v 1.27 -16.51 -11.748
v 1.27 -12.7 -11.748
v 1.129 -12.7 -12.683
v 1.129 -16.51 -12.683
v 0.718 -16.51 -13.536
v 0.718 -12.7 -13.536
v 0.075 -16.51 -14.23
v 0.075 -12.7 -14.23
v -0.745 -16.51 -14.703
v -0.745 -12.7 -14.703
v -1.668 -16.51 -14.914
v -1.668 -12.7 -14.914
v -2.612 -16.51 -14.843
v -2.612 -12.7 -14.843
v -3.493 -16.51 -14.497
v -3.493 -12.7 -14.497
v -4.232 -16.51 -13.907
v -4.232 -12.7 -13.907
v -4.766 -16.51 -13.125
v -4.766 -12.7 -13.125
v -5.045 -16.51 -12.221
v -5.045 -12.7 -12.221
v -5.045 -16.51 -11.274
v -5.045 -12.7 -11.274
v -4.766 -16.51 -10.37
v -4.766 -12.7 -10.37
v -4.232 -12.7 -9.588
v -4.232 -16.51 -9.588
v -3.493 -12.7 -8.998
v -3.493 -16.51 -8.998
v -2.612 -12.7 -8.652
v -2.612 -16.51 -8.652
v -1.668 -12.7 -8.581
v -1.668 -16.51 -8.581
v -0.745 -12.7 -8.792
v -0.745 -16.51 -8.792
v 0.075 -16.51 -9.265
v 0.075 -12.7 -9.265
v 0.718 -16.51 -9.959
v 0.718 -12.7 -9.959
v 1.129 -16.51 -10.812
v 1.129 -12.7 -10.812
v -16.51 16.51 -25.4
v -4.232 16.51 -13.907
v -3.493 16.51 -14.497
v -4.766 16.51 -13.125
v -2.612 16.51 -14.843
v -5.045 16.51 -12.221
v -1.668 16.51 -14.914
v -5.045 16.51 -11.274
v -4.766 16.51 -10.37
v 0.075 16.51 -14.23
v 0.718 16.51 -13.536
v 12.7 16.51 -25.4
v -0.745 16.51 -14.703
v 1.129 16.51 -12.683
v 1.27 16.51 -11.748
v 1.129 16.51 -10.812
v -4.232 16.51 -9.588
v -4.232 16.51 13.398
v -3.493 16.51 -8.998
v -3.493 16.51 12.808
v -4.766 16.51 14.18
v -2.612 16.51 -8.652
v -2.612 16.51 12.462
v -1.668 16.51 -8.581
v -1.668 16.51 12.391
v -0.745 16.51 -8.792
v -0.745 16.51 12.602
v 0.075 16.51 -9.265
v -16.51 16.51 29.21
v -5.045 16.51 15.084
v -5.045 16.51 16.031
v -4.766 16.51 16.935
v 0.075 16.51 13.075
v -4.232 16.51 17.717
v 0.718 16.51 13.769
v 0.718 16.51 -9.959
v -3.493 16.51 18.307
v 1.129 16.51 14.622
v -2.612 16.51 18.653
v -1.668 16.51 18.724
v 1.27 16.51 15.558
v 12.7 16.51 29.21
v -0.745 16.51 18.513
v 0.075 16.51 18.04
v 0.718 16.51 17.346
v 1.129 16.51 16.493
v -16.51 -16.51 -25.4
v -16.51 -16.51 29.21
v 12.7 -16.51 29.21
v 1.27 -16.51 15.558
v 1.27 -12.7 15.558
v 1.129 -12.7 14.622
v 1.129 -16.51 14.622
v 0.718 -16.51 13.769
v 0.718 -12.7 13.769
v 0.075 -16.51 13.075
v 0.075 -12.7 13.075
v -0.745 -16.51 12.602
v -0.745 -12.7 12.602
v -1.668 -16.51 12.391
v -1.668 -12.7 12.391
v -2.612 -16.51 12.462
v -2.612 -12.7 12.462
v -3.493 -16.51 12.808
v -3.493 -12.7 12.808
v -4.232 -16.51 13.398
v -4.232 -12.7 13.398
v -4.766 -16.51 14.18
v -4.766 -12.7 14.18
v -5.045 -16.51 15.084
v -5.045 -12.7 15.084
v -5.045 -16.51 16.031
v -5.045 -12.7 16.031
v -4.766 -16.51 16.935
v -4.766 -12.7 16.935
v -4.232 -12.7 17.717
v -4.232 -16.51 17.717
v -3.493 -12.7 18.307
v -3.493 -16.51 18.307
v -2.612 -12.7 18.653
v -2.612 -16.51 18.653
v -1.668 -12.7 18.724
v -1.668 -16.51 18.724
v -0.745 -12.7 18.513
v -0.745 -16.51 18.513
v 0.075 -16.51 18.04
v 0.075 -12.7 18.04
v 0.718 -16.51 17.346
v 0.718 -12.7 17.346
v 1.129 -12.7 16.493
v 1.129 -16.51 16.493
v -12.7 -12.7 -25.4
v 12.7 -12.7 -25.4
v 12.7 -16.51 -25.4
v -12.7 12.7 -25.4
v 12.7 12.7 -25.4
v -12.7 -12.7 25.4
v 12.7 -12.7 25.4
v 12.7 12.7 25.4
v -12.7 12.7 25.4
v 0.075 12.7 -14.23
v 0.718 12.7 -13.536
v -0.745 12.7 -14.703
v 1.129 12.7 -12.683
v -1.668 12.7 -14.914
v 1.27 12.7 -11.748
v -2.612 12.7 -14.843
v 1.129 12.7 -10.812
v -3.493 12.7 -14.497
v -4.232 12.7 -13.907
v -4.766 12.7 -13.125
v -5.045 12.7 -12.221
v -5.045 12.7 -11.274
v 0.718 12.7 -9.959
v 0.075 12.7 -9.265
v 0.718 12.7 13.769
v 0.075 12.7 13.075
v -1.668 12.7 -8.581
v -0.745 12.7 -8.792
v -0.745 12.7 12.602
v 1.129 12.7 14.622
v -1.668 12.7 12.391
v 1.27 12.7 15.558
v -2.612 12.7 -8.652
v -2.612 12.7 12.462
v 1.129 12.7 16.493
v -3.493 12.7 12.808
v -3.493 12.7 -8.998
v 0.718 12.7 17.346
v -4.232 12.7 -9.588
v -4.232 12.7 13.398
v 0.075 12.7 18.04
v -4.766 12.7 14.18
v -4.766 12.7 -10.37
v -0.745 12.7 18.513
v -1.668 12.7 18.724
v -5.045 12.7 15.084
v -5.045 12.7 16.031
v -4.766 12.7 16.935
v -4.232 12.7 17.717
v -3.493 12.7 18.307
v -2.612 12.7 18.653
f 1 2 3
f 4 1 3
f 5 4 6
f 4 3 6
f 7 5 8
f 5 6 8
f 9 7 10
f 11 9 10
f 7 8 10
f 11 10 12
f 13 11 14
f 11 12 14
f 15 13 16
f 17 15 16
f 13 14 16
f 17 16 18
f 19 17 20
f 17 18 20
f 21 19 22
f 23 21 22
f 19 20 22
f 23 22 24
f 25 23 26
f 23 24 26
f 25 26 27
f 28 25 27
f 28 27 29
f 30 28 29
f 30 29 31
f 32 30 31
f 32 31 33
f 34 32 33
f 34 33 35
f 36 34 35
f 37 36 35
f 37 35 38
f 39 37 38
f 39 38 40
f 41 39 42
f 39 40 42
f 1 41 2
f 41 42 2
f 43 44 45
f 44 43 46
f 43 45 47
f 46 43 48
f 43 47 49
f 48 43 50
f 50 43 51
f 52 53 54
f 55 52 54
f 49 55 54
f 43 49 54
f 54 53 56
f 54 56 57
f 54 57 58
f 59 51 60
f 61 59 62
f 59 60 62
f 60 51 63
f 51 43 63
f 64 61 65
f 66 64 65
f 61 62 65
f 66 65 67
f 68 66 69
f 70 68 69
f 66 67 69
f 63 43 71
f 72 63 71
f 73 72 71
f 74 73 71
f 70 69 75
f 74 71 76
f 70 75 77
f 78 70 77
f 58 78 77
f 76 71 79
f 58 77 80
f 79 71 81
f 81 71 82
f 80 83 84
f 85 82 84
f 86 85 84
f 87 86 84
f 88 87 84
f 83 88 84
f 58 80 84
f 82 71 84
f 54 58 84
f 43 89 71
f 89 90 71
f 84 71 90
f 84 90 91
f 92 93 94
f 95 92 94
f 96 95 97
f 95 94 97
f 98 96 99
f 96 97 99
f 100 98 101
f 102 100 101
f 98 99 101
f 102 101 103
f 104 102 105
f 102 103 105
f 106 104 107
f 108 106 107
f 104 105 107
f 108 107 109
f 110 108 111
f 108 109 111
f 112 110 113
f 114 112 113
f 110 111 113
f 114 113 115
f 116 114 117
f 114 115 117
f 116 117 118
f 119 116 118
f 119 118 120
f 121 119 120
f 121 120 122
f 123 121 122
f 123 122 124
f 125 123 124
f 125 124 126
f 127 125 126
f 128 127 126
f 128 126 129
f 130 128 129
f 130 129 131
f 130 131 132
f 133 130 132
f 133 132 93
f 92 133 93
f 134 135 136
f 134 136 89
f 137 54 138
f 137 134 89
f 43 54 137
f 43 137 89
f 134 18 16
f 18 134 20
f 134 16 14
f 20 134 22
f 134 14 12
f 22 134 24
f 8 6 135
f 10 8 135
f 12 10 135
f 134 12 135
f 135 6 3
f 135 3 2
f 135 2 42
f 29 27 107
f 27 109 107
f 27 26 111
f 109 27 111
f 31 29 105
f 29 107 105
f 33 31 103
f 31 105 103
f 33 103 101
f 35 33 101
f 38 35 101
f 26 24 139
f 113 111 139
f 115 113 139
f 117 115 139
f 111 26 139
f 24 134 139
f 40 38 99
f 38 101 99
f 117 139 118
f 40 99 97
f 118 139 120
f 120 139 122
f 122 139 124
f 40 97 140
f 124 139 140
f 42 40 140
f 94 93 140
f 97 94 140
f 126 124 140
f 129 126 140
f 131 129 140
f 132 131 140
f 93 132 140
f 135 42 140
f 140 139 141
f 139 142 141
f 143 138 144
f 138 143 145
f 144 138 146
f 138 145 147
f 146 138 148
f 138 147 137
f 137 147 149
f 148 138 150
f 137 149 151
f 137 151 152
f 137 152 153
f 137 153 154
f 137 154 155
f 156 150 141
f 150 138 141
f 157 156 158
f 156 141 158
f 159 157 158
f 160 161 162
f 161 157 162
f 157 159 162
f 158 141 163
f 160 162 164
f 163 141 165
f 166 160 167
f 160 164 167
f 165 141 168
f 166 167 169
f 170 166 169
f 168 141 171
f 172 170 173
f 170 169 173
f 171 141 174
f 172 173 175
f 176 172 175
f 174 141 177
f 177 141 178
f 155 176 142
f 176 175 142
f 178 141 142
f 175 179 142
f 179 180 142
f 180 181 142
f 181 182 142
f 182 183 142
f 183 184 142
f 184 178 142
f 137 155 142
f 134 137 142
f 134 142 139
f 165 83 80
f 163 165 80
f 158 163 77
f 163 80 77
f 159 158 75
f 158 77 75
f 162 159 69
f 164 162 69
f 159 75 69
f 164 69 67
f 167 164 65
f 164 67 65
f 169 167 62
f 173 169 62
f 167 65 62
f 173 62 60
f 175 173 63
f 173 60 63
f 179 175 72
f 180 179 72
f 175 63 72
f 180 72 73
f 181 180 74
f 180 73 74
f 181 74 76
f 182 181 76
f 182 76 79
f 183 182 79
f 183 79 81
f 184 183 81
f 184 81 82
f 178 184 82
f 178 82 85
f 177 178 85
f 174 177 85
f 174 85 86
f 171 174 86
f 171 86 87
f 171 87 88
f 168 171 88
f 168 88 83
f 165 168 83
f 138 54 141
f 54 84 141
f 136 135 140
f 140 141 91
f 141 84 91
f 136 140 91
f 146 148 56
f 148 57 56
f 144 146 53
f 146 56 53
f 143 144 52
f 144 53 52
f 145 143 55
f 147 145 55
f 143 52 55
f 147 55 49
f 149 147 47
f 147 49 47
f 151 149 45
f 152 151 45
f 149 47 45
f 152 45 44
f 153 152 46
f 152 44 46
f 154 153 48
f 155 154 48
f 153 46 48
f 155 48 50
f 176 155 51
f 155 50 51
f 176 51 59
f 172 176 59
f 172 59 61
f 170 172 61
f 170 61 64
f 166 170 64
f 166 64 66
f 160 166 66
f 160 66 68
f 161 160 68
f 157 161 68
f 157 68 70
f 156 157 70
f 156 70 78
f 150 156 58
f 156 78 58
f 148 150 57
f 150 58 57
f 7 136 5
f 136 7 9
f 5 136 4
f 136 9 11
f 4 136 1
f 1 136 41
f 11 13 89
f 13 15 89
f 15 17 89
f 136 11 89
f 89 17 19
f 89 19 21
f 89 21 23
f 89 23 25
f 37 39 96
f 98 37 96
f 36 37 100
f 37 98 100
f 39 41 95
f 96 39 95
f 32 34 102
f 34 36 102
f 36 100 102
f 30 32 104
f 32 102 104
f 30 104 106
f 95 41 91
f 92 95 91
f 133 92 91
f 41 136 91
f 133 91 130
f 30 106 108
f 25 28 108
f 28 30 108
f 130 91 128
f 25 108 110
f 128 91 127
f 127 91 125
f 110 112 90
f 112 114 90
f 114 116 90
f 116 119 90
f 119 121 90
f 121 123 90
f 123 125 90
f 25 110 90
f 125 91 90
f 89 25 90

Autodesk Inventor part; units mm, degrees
ref_plane "YZ Plane" through (0, 0, 0) normal (1, 0, 0) x (0, 1, 0)
ref_plane "XZ Plane" through (0, 0, 0) normal (0, 1, 0) x (-1, 0, 0)
ref_plane "XY Plane" through (0, 0, 0) normal (0, 0, 1) x (1, 0, 0)
sketch "Sketch1" plane through (0, 0, 0) normal (0, 0, 1) x (1, 0, 0)
  line L0 (-12.7, -12.7) -> (12.7, -12.7)
  line L1 (12.7, 12.7) -> (-12.7, 12.7)
  line L2 (-12.7, 12.7) -> (-12.7, -12.7)
  line L3 (-12.7, -12.7) -> (12.7, 12.7) construction
  line L4 (12.7, -12.7) -> (-12.7, 12.7) construction
  line L5 (12.7, 12.7) -> (12.7, 16.51)
  line L6 (12.7, 16.51) -> (-16.51, 16.51)
  line L7 (-16.51, 16.51) -> (-16.51, 12.7)
  line L8 (12.7, -12.7) -> (12.7, -16.51)
  line L9 (12.7, -16.51) -> (-16.51, -16.51)
  line L10 (-16.51, -16.51) -> (-16.51, 12.7)
  point P0 (0, 0)
  dimension "d0" = 25.4
  dimension "d1" = 25.4
  dimension "d2" = 3.81
  dimension "d3" = 29.21
  dimension "d4" = 3.81
  dimension "d5" = 29.21
extrude "Extrusion1" add sketch "Sketch1" along normal blind 29.21
sketch "Sketch2" plane through (0, 0, 29.21) normal (0, 0, 1) x (1, 0, 0)
  line L0 (12.7, 12.7) -> (12.7, 16.51) projected
  line L1 (12.7, 16.51) -> (-16.51, 16.51) projected
  line L2 (-16.51, 16.51) -> (-16.51, -16.51) projected
  line L3 (-16.51, -16.51) -> (12.7, -16.51) projected
  line L4 (12.7, -16.51) -> (12.7, -12.7) projected
  line L5 (12.7, 12.7) -> (12.7, -12.7)
  point P0 (0, 0)
extrude "Extrusion2" add sketch "Sketch2" against normal blind 3.81
sketch "Sketch3" plane through (0, 0, 0) normal (0, 0, -1) x (-1, 0, 0)
  line L0 (12.7, -12.7) -> (-12.7, -12.7) projected
  line L1 (-12.7, -12.7) -> (-12.7, -16.51) projected
  line L2 (-12.7, -16.51) -> (16.51, -16.51) projected
  line L3 (16.51, -16.51) -> (16.51, 16.51) projected
  line L4 (16.51, 16.51) -> (-12.7, 16.51) projected
  line L5 (-12.7, 16.51) -> (-12.7, 12.7) projected
  line L6 (-12.7, 12.7) -> (12.7, 12.7) projected
  line L7 (12.7, 12.7) -> (12.7, -12.7) projected
  point P0 (0, 0)
extrude "Extrusion3" add sketch "Sketch3" along normal blind 25.4
sketch "Sketch4" plane through (-16.51, 16.51, 29.21) normal (0, 1, 0) x (1, 0, 0)
  circle A0 centre (14.605, 40.9575) radius 3.175
  circle A1 centre (14.605, 13.6525) radius 3.175
  point P0 (16.51, 29.21)
  dimension "d12" = 6.35
  dimension "d13" = 6.35
extrude "Extrusion4" cut sketch "Sketch4" against normal blind 50.8
properties part number "west coast corner"
